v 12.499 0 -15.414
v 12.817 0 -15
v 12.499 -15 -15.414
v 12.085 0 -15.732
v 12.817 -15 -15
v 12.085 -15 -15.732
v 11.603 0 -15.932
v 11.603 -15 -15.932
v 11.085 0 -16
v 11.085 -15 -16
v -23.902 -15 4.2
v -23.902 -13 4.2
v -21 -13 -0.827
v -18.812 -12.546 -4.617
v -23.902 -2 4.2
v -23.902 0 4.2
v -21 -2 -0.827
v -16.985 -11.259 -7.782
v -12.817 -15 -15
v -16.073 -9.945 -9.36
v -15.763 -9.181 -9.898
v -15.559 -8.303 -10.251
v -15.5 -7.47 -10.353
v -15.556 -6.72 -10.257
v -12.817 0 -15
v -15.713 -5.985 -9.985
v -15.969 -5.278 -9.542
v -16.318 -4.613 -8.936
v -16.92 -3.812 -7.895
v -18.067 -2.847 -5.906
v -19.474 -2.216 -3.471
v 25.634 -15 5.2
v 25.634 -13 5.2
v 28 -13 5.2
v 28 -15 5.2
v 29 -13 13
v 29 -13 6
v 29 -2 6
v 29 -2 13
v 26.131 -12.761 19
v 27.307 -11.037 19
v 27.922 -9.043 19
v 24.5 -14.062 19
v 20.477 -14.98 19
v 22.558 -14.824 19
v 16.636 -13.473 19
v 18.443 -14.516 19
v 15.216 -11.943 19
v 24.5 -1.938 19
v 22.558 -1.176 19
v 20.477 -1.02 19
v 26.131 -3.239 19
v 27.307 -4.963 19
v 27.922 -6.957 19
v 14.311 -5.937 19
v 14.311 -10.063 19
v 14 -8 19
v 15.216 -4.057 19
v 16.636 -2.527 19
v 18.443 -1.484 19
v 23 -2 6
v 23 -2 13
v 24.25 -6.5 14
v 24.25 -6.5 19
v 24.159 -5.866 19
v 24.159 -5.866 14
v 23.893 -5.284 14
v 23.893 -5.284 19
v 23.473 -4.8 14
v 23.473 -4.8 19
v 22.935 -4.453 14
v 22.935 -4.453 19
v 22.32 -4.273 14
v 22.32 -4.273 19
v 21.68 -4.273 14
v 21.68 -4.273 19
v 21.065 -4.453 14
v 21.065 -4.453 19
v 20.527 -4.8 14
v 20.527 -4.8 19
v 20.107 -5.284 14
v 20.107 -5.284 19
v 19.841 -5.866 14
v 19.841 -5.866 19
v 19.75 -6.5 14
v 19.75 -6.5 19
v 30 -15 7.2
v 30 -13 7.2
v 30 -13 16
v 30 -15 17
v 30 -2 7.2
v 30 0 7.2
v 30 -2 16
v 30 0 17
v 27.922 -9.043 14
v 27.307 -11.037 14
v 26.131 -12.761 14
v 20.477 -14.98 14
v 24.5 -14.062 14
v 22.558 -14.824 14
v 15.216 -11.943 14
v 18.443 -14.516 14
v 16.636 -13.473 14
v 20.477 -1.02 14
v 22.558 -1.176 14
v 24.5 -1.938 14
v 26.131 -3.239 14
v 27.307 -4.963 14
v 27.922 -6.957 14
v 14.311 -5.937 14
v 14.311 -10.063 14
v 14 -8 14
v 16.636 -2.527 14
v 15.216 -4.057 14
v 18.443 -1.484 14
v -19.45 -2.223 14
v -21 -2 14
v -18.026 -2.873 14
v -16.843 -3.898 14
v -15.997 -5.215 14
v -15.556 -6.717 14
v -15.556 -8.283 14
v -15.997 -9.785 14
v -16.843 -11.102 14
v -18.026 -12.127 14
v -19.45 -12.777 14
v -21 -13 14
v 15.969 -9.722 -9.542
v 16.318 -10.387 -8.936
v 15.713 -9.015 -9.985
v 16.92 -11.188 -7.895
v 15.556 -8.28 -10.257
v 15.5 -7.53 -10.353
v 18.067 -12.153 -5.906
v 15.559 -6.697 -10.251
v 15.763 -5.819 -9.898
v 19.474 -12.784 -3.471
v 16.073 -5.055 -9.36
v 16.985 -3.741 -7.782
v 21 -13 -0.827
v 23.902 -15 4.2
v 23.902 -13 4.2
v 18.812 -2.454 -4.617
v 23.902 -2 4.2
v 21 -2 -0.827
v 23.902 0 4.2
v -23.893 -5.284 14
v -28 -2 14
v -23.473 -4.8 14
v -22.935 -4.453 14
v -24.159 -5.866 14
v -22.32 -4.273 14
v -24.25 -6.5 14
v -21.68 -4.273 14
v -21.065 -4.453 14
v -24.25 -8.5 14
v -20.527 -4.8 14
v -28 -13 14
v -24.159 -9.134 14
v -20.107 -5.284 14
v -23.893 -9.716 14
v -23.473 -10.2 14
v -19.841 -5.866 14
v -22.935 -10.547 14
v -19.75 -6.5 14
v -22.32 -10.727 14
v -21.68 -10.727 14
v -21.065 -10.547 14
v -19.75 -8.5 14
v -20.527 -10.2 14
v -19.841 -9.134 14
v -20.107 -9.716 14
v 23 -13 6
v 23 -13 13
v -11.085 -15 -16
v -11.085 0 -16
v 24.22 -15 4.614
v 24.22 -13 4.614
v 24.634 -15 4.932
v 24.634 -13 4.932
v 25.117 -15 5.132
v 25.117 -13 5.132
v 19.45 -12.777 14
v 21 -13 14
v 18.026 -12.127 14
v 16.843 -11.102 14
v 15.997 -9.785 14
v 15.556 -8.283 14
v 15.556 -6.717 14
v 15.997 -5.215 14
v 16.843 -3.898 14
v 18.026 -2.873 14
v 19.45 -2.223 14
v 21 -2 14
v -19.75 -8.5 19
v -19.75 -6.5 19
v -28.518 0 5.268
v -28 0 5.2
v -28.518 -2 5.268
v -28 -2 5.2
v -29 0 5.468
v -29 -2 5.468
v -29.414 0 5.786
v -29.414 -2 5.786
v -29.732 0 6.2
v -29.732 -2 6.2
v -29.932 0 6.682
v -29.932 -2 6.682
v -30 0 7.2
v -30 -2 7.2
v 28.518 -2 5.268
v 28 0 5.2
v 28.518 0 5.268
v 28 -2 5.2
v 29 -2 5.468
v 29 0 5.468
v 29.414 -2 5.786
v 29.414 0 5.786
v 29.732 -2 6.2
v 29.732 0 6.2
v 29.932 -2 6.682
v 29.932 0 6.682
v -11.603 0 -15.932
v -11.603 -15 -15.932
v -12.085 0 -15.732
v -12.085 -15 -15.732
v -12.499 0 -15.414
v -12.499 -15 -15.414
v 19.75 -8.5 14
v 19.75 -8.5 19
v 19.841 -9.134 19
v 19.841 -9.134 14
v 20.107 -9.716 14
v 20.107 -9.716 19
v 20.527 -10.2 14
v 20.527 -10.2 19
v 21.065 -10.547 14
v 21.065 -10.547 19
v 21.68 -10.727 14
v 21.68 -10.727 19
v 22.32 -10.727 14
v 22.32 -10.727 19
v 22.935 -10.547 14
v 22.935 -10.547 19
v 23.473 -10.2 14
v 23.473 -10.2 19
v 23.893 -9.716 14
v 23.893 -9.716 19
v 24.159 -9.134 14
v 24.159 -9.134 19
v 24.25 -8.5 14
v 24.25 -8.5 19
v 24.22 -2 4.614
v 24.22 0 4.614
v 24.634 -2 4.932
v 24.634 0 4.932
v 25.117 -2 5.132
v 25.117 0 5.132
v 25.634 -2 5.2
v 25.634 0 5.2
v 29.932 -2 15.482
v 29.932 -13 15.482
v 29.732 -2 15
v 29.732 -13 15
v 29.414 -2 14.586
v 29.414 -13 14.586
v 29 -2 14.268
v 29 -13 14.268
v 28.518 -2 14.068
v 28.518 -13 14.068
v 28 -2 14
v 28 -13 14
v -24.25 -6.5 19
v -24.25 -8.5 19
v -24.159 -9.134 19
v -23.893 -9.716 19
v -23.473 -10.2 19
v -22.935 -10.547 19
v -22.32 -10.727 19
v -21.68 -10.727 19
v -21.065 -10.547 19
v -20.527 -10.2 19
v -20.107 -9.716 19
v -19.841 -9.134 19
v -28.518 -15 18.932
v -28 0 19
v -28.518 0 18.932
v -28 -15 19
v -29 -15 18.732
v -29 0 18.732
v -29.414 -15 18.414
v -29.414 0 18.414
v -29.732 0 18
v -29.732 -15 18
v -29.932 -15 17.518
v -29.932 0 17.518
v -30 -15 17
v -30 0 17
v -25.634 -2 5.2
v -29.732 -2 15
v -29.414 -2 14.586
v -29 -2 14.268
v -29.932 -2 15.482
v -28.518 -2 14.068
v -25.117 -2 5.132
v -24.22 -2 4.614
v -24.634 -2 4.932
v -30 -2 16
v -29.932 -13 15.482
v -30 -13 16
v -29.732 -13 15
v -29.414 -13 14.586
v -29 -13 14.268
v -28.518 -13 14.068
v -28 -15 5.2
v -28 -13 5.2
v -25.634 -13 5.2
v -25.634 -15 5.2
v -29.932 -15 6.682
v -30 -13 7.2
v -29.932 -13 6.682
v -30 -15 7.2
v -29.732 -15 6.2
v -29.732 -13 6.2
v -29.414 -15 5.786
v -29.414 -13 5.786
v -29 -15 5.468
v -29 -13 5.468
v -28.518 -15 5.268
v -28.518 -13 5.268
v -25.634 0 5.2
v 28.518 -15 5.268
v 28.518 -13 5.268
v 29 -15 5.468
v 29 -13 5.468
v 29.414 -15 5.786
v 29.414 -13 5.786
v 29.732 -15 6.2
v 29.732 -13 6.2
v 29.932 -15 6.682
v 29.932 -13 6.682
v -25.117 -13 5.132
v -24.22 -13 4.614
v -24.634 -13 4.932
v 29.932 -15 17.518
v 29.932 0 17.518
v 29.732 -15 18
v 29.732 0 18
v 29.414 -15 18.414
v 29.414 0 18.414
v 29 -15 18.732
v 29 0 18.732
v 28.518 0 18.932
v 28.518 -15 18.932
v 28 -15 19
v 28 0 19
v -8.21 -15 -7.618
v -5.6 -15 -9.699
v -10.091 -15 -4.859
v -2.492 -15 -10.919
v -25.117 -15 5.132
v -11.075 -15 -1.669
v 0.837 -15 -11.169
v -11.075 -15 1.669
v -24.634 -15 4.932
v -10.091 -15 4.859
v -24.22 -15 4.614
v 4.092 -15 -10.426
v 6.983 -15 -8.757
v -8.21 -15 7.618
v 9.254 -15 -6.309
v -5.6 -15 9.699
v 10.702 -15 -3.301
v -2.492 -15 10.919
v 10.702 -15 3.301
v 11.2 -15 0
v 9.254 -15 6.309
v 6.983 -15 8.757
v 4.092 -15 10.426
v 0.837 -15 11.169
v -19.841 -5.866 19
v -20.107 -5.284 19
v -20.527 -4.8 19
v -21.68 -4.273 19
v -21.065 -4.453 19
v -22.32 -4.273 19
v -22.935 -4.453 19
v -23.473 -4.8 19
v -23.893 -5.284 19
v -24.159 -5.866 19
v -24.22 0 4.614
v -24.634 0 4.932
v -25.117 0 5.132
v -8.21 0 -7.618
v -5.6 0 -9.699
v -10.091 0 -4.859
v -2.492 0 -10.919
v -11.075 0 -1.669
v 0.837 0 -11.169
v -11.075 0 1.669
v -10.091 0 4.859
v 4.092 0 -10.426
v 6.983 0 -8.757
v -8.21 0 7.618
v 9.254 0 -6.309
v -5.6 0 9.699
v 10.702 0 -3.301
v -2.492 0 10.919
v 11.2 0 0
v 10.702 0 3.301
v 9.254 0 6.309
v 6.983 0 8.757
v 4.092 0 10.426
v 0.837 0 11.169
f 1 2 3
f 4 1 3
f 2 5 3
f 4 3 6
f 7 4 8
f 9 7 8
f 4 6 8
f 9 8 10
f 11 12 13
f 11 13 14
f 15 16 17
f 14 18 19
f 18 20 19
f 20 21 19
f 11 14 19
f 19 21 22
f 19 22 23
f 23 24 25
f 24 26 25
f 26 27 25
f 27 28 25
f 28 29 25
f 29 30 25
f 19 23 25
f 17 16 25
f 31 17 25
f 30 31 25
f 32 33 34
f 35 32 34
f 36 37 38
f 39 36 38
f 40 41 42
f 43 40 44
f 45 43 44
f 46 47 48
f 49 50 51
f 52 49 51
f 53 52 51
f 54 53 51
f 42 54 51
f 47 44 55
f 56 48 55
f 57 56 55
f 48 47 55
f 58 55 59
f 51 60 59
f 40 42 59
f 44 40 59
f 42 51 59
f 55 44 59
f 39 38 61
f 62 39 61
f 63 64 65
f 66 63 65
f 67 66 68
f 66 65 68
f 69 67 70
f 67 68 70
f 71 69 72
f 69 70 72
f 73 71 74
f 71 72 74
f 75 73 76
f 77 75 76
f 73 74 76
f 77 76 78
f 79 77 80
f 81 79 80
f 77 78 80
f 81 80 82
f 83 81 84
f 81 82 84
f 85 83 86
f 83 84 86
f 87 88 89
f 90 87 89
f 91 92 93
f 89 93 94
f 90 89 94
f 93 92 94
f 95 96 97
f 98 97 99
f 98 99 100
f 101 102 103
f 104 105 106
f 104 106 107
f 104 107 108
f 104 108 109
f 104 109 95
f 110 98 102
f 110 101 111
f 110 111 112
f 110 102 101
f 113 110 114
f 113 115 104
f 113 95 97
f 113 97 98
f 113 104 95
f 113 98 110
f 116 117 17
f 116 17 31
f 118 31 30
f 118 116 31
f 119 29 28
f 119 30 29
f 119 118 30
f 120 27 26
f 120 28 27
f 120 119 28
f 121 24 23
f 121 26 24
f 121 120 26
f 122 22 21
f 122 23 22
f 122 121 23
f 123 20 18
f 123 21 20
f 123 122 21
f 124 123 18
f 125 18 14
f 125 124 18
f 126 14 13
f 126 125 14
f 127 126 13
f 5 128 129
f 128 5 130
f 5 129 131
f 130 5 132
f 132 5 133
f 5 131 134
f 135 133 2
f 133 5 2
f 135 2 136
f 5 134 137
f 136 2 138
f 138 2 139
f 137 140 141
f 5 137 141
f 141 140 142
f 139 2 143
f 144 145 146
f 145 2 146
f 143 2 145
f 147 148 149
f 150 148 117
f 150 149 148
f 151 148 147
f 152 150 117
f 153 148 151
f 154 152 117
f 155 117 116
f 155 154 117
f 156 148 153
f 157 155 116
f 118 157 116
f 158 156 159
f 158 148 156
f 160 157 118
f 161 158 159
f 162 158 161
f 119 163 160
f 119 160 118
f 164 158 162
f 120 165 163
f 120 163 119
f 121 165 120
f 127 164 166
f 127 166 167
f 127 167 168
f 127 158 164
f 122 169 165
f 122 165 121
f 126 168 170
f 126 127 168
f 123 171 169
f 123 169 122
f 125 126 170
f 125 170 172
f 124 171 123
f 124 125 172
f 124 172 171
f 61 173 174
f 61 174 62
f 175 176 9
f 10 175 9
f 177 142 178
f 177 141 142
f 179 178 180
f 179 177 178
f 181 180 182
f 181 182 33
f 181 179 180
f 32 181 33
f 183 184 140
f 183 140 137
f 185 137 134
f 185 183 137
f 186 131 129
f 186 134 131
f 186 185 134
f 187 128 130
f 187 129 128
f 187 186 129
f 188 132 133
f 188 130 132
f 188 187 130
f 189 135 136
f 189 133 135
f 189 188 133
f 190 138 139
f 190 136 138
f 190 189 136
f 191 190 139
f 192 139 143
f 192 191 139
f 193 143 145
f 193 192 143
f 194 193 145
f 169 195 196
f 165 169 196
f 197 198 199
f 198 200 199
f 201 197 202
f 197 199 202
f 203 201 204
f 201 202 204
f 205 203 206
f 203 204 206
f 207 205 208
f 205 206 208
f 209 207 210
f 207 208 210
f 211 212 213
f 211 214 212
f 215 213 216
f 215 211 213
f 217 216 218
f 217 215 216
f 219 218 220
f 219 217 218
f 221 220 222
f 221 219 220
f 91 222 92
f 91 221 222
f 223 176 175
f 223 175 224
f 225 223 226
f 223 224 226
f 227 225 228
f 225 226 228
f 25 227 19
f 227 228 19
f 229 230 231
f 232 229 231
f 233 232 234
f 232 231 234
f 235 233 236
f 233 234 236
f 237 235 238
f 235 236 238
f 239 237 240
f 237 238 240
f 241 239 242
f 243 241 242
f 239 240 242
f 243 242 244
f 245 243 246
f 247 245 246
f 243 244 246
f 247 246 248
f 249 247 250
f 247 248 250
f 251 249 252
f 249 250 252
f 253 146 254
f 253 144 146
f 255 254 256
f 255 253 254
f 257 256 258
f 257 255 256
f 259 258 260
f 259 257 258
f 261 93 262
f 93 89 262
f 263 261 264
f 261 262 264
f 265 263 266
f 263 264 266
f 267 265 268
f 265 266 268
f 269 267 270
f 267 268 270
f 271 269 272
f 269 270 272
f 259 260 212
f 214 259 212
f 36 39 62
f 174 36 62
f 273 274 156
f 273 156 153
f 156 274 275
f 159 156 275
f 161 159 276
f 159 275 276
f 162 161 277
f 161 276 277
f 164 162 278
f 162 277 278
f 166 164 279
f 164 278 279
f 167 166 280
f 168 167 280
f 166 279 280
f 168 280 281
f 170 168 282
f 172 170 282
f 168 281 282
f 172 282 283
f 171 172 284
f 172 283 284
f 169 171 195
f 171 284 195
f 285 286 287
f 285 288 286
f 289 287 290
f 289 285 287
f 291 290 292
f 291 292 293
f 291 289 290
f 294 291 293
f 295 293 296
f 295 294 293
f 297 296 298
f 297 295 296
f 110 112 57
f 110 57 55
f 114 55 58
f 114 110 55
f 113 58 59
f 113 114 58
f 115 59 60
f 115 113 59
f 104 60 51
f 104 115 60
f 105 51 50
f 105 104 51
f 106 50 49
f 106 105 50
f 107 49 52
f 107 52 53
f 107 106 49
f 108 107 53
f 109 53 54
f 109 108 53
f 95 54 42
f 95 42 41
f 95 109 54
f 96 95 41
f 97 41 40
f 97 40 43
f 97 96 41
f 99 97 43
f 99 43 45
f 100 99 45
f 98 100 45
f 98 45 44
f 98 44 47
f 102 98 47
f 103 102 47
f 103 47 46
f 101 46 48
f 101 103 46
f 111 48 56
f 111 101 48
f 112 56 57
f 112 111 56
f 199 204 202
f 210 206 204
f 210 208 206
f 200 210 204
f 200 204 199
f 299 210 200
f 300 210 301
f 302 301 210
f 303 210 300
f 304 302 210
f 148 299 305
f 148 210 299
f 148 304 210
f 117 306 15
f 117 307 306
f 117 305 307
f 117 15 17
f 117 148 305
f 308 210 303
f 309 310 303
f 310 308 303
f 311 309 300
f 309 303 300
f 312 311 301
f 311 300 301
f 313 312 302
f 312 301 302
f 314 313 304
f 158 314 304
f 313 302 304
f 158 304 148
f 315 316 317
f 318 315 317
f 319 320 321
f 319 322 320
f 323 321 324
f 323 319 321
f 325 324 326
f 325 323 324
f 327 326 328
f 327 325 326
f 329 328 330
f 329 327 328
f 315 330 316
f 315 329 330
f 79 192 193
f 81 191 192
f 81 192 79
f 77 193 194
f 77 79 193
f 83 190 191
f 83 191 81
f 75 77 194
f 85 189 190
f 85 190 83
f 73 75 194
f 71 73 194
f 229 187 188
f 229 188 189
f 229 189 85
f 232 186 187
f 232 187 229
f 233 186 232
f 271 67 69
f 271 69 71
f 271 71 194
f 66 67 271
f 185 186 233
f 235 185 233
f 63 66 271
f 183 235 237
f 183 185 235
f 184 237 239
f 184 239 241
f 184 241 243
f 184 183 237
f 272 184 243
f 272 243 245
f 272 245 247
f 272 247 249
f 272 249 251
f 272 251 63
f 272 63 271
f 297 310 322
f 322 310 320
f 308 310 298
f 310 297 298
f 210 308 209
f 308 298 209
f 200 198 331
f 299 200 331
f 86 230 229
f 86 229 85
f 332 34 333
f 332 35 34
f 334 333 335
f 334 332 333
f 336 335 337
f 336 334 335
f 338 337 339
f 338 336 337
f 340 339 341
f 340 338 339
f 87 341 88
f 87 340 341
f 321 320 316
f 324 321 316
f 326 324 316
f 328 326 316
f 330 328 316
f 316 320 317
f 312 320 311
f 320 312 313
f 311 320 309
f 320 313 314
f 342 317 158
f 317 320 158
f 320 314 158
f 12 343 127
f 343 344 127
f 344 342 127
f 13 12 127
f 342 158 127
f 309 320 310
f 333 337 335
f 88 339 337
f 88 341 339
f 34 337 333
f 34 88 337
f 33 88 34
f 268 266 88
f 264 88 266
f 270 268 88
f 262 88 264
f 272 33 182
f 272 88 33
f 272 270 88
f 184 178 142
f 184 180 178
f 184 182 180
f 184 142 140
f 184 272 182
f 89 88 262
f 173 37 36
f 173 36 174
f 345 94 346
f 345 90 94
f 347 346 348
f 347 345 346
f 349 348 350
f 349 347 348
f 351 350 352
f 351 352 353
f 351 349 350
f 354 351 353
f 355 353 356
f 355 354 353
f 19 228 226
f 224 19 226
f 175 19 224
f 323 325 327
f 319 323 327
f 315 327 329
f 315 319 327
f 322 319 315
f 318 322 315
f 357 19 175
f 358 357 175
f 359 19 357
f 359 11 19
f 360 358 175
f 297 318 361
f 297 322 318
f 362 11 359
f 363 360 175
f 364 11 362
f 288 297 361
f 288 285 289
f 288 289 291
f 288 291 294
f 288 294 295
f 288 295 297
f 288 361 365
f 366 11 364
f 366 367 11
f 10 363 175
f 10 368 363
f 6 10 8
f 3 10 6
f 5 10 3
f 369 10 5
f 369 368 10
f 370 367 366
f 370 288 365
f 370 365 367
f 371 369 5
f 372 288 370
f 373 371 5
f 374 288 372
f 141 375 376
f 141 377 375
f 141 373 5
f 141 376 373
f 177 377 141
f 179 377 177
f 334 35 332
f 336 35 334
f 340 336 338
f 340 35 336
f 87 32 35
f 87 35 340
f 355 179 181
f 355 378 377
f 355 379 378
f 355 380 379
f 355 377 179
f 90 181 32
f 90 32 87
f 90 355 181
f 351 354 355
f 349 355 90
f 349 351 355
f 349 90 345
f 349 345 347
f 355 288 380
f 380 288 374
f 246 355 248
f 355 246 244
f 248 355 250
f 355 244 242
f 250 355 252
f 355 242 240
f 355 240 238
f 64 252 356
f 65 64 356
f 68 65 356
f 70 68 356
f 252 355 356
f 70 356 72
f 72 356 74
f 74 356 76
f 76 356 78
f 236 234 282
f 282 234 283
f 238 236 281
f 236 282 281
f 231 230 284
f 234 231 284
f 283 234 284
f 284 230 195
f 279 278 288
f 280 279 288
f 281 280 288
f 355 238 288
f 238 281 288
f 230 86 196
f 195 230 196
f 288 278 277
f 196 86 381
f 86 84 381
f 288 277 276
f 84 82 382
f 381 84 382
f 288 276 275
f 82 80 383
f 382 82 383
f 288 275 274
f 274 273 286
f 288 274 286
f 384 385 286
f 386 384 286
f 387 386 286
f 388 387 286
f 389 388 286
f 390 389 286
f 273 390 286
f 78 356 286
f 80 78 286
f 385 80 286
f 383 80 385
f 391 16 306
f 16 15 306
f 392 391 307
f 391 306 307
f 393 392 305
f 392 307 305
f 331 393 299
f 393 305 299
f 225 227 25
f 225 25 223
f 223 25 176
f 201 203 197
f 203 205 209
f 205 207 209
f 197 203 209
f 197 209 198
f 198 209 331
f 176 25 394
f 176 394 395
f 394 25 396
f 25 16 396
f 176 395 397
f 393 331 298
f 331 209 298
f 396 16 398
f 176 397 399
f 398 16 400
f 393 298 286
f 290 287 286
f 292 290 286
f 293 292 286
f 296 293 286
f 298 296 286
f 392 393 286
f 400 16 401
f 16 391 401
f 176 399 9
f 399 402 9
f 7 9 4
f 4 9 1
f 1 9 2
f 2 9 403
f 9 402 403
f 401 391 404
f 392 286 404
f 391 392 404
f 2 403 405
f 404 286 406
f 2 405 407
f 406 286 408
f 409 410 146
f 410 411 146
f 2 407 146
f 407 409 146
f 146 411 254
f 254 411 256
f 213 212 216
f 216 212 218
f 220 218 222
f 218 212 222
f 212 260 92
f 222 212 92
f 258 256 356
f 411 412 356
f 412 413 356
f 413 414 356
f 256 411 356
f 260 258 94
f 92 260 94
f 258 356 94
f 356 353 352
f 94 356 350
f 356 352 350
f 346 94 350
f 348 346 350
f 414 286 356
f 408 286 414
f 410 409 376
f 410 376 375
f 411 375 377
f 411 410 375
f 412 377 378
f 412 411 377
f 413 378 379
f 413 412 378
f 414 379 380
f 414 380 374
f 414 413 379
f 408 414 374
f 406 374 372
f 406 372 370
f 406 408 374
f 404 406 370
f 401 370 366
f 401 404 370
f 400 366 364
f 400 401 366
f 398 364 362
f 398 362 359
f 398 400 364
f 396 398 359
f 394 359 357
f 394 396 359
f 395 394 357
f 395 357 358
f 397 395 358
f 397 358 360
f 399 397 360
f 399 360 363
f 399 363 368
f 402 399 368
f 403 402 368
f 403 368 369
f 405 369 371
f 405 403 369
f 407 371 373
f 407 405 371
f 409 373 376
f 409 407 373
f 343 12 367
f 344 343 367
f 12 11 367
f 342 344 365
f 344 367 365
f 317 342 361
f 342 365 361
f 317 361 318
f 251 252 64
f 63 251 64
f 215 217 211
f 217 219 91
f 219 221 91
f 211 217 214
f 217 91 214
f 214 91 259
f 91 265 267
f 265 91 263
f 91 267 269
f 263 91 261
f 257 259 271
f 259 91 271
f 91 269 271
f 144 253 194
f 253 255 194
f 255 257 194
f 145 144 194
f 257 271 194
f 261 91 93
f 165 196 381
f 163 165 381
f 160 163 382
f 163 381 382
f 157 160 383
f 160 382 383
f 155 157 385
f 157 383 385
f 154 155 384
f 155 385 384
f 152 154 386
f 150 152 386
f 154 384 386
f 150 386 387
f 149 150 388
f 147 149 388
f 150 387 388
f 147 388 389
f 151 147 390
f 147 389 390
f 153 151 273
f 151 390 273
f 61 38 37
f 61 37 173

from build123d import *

# Parameters (mm, degrees)
SKETCH_R          = 11.2
PAD_DEPTH         = 15
POCKET_DEPTH      = 8.8
POCKET_DEPTH_BACK = -100
POCKET001_DEPTH   = 5
FILLET_R          = 2
BOX_W             = 6
BOX_H             = 11
BOX_DEPTH         = 7
CYLINDER_R        = 7
CYLINDER_DEPTH    = 5


with BuildPart() as body:
    # Sketch → Pad (new body)
    with BuildSketch(Plane.XZ):
        Polygon((12.239826, -16), (24.479651, 5.2), (30, 5.2), (30, 19), (-30, 19), (-30, 5.2), (-24.479651, 5.2), (-12.239826, -16), align=None)
        Circle(SKETCH_R, mode=Mode.SUBTRACT)
    extrude(amount=PAD_DEPTH)

    # Sketch001 (on Face1 of Pad) → Pocket (cut, two sides)
    with BuildSketch(Plane(origin=(0, 0, 5.2), x_dir=(1, 0, 0), z_dir=(0, 0, -1))) as pocket_sk:
        with BuildLine():
            ThreePointArc((-30, 13), (-35.5, 7.5), (-30, 2))
            Line((-30, 2), (-21, 2))
            ThreePointArc((-21, 2), (-15.5, 7.5), (-21, 13))
            Line((-30, 13), (-21, 13))
        make_face()
        with BuildLine():
            ThreePointArc((30, 2), (35.5, 7.5), (30, 13))
            Line((30, 13), (21, 13))
            ThreePointArc((21, 13), (15.5, 7.5), (21, 2))
            Line((30, 2), (21, 2))
        make_face()
    extrude(amount=-POCKET_DEPTH, mode=Mode.SUBTRACT)
    extrude(pocket_sk.sketch, amount=-POCKET_DEPTH_BACK, mode=Mode.SUBTRACT)

    # Sketch002 (on Face10 of Pocket) → Pocket001 (cut)
    with BuildSketch(Plane(origin=(0, 0, 19), x_dir=(-1, 0, 0), z_dir=(0, 0, 1))):
        with BuildLine():
            ThreePointArc((-19.75, 8.5), (-22, 10.75), (-24.25, 8.5))
            Line((-24.25, 8.5), (-24.25, 6.5))
            ThreePointArc((-24.25, 6.5), (-22, 4.25), (-19.75, 6.5))
            Line((-19.75, 8.5), (-19.75, 6.5))
        make_face()
        with BuildLine():
            ThreePointArc((24.25, 8.5), (22, 10.75), (19.75, 8.5))
            Line((19.75, 8.5), (19.75, 6.5))
            ThreePointArc((19.75, 6.5), (22, 4.25), (24.25, 6.5))
            Line((24.25, 8.5), (24.25, 6.5))
        make_face()
    extrude(amount=-POCKET001_DEPTH, mode=Mode.SUBTRACT)

    # Fillet
    fillet_edges = [body.edges().sort_by_distance(p)[0] for p in [
        (12.239826, -7.5, -16),
        (-12.239826, -7.5, -16),
        (30, -7.5, 14),
        (30, -7.5, 19),
        (30, -1, 5.2),
        (30, -14, 5.2),
        (24.479651, -14, 5.2),
        (24.479651, -1, 5.2),
        (-24.479651, -1, 5.2),
        (-30, -1, 5.2),
        (-30, -7.5, 14),
        (-30, -7.5, 19),
        (-30, -14, 5.2),
        (-24.479651, -14, 5.2),
    ]]
    fillet(fillet_edges, radius=FILLET_R)


with BuildPart() as cube:
    # Box → Box (new body)
    with BuildSketch(Plane(origin=(-29, -13, 6), x_dir=(1, 0, 0), z_dir=(0, 0, 1))):
        with Locations((3, 5.5)):
            Rectangle(BOX_W, BOX_H)
    extrude(amount=BOX_DEPTH)


with BuildPart() as support_cube:
    # Part__Mirroring: instance of Cube
    add(cube.part.mirror(Plane(origin=(0, 0, 0), x_dir=(0, -1, 0), z_dir=(1, 0, 0))))


with BuildPart() as cylinder:
    # Cylinder → Cylinder (new body)
    with BuildSketch(Plane(origin=(-21, -8, 14), x_dir=(1, 0, 0), z_dir=(0, 0, 1))):
        Circle(CYLINDER_R)
    extrude(amount=CYLINDER_DEPTH)


with BuildPart() as density_infill:
    # Part__Mirroring001: instance of Cylinder
    add(cylinder.part.mirror(Plane(origin=(0, 0, 0), x_dir=(0, -1, 0), z_dir=(1, 0, 0))))


solid = Compound([body.part, support_cube.part, density_infill.part])
